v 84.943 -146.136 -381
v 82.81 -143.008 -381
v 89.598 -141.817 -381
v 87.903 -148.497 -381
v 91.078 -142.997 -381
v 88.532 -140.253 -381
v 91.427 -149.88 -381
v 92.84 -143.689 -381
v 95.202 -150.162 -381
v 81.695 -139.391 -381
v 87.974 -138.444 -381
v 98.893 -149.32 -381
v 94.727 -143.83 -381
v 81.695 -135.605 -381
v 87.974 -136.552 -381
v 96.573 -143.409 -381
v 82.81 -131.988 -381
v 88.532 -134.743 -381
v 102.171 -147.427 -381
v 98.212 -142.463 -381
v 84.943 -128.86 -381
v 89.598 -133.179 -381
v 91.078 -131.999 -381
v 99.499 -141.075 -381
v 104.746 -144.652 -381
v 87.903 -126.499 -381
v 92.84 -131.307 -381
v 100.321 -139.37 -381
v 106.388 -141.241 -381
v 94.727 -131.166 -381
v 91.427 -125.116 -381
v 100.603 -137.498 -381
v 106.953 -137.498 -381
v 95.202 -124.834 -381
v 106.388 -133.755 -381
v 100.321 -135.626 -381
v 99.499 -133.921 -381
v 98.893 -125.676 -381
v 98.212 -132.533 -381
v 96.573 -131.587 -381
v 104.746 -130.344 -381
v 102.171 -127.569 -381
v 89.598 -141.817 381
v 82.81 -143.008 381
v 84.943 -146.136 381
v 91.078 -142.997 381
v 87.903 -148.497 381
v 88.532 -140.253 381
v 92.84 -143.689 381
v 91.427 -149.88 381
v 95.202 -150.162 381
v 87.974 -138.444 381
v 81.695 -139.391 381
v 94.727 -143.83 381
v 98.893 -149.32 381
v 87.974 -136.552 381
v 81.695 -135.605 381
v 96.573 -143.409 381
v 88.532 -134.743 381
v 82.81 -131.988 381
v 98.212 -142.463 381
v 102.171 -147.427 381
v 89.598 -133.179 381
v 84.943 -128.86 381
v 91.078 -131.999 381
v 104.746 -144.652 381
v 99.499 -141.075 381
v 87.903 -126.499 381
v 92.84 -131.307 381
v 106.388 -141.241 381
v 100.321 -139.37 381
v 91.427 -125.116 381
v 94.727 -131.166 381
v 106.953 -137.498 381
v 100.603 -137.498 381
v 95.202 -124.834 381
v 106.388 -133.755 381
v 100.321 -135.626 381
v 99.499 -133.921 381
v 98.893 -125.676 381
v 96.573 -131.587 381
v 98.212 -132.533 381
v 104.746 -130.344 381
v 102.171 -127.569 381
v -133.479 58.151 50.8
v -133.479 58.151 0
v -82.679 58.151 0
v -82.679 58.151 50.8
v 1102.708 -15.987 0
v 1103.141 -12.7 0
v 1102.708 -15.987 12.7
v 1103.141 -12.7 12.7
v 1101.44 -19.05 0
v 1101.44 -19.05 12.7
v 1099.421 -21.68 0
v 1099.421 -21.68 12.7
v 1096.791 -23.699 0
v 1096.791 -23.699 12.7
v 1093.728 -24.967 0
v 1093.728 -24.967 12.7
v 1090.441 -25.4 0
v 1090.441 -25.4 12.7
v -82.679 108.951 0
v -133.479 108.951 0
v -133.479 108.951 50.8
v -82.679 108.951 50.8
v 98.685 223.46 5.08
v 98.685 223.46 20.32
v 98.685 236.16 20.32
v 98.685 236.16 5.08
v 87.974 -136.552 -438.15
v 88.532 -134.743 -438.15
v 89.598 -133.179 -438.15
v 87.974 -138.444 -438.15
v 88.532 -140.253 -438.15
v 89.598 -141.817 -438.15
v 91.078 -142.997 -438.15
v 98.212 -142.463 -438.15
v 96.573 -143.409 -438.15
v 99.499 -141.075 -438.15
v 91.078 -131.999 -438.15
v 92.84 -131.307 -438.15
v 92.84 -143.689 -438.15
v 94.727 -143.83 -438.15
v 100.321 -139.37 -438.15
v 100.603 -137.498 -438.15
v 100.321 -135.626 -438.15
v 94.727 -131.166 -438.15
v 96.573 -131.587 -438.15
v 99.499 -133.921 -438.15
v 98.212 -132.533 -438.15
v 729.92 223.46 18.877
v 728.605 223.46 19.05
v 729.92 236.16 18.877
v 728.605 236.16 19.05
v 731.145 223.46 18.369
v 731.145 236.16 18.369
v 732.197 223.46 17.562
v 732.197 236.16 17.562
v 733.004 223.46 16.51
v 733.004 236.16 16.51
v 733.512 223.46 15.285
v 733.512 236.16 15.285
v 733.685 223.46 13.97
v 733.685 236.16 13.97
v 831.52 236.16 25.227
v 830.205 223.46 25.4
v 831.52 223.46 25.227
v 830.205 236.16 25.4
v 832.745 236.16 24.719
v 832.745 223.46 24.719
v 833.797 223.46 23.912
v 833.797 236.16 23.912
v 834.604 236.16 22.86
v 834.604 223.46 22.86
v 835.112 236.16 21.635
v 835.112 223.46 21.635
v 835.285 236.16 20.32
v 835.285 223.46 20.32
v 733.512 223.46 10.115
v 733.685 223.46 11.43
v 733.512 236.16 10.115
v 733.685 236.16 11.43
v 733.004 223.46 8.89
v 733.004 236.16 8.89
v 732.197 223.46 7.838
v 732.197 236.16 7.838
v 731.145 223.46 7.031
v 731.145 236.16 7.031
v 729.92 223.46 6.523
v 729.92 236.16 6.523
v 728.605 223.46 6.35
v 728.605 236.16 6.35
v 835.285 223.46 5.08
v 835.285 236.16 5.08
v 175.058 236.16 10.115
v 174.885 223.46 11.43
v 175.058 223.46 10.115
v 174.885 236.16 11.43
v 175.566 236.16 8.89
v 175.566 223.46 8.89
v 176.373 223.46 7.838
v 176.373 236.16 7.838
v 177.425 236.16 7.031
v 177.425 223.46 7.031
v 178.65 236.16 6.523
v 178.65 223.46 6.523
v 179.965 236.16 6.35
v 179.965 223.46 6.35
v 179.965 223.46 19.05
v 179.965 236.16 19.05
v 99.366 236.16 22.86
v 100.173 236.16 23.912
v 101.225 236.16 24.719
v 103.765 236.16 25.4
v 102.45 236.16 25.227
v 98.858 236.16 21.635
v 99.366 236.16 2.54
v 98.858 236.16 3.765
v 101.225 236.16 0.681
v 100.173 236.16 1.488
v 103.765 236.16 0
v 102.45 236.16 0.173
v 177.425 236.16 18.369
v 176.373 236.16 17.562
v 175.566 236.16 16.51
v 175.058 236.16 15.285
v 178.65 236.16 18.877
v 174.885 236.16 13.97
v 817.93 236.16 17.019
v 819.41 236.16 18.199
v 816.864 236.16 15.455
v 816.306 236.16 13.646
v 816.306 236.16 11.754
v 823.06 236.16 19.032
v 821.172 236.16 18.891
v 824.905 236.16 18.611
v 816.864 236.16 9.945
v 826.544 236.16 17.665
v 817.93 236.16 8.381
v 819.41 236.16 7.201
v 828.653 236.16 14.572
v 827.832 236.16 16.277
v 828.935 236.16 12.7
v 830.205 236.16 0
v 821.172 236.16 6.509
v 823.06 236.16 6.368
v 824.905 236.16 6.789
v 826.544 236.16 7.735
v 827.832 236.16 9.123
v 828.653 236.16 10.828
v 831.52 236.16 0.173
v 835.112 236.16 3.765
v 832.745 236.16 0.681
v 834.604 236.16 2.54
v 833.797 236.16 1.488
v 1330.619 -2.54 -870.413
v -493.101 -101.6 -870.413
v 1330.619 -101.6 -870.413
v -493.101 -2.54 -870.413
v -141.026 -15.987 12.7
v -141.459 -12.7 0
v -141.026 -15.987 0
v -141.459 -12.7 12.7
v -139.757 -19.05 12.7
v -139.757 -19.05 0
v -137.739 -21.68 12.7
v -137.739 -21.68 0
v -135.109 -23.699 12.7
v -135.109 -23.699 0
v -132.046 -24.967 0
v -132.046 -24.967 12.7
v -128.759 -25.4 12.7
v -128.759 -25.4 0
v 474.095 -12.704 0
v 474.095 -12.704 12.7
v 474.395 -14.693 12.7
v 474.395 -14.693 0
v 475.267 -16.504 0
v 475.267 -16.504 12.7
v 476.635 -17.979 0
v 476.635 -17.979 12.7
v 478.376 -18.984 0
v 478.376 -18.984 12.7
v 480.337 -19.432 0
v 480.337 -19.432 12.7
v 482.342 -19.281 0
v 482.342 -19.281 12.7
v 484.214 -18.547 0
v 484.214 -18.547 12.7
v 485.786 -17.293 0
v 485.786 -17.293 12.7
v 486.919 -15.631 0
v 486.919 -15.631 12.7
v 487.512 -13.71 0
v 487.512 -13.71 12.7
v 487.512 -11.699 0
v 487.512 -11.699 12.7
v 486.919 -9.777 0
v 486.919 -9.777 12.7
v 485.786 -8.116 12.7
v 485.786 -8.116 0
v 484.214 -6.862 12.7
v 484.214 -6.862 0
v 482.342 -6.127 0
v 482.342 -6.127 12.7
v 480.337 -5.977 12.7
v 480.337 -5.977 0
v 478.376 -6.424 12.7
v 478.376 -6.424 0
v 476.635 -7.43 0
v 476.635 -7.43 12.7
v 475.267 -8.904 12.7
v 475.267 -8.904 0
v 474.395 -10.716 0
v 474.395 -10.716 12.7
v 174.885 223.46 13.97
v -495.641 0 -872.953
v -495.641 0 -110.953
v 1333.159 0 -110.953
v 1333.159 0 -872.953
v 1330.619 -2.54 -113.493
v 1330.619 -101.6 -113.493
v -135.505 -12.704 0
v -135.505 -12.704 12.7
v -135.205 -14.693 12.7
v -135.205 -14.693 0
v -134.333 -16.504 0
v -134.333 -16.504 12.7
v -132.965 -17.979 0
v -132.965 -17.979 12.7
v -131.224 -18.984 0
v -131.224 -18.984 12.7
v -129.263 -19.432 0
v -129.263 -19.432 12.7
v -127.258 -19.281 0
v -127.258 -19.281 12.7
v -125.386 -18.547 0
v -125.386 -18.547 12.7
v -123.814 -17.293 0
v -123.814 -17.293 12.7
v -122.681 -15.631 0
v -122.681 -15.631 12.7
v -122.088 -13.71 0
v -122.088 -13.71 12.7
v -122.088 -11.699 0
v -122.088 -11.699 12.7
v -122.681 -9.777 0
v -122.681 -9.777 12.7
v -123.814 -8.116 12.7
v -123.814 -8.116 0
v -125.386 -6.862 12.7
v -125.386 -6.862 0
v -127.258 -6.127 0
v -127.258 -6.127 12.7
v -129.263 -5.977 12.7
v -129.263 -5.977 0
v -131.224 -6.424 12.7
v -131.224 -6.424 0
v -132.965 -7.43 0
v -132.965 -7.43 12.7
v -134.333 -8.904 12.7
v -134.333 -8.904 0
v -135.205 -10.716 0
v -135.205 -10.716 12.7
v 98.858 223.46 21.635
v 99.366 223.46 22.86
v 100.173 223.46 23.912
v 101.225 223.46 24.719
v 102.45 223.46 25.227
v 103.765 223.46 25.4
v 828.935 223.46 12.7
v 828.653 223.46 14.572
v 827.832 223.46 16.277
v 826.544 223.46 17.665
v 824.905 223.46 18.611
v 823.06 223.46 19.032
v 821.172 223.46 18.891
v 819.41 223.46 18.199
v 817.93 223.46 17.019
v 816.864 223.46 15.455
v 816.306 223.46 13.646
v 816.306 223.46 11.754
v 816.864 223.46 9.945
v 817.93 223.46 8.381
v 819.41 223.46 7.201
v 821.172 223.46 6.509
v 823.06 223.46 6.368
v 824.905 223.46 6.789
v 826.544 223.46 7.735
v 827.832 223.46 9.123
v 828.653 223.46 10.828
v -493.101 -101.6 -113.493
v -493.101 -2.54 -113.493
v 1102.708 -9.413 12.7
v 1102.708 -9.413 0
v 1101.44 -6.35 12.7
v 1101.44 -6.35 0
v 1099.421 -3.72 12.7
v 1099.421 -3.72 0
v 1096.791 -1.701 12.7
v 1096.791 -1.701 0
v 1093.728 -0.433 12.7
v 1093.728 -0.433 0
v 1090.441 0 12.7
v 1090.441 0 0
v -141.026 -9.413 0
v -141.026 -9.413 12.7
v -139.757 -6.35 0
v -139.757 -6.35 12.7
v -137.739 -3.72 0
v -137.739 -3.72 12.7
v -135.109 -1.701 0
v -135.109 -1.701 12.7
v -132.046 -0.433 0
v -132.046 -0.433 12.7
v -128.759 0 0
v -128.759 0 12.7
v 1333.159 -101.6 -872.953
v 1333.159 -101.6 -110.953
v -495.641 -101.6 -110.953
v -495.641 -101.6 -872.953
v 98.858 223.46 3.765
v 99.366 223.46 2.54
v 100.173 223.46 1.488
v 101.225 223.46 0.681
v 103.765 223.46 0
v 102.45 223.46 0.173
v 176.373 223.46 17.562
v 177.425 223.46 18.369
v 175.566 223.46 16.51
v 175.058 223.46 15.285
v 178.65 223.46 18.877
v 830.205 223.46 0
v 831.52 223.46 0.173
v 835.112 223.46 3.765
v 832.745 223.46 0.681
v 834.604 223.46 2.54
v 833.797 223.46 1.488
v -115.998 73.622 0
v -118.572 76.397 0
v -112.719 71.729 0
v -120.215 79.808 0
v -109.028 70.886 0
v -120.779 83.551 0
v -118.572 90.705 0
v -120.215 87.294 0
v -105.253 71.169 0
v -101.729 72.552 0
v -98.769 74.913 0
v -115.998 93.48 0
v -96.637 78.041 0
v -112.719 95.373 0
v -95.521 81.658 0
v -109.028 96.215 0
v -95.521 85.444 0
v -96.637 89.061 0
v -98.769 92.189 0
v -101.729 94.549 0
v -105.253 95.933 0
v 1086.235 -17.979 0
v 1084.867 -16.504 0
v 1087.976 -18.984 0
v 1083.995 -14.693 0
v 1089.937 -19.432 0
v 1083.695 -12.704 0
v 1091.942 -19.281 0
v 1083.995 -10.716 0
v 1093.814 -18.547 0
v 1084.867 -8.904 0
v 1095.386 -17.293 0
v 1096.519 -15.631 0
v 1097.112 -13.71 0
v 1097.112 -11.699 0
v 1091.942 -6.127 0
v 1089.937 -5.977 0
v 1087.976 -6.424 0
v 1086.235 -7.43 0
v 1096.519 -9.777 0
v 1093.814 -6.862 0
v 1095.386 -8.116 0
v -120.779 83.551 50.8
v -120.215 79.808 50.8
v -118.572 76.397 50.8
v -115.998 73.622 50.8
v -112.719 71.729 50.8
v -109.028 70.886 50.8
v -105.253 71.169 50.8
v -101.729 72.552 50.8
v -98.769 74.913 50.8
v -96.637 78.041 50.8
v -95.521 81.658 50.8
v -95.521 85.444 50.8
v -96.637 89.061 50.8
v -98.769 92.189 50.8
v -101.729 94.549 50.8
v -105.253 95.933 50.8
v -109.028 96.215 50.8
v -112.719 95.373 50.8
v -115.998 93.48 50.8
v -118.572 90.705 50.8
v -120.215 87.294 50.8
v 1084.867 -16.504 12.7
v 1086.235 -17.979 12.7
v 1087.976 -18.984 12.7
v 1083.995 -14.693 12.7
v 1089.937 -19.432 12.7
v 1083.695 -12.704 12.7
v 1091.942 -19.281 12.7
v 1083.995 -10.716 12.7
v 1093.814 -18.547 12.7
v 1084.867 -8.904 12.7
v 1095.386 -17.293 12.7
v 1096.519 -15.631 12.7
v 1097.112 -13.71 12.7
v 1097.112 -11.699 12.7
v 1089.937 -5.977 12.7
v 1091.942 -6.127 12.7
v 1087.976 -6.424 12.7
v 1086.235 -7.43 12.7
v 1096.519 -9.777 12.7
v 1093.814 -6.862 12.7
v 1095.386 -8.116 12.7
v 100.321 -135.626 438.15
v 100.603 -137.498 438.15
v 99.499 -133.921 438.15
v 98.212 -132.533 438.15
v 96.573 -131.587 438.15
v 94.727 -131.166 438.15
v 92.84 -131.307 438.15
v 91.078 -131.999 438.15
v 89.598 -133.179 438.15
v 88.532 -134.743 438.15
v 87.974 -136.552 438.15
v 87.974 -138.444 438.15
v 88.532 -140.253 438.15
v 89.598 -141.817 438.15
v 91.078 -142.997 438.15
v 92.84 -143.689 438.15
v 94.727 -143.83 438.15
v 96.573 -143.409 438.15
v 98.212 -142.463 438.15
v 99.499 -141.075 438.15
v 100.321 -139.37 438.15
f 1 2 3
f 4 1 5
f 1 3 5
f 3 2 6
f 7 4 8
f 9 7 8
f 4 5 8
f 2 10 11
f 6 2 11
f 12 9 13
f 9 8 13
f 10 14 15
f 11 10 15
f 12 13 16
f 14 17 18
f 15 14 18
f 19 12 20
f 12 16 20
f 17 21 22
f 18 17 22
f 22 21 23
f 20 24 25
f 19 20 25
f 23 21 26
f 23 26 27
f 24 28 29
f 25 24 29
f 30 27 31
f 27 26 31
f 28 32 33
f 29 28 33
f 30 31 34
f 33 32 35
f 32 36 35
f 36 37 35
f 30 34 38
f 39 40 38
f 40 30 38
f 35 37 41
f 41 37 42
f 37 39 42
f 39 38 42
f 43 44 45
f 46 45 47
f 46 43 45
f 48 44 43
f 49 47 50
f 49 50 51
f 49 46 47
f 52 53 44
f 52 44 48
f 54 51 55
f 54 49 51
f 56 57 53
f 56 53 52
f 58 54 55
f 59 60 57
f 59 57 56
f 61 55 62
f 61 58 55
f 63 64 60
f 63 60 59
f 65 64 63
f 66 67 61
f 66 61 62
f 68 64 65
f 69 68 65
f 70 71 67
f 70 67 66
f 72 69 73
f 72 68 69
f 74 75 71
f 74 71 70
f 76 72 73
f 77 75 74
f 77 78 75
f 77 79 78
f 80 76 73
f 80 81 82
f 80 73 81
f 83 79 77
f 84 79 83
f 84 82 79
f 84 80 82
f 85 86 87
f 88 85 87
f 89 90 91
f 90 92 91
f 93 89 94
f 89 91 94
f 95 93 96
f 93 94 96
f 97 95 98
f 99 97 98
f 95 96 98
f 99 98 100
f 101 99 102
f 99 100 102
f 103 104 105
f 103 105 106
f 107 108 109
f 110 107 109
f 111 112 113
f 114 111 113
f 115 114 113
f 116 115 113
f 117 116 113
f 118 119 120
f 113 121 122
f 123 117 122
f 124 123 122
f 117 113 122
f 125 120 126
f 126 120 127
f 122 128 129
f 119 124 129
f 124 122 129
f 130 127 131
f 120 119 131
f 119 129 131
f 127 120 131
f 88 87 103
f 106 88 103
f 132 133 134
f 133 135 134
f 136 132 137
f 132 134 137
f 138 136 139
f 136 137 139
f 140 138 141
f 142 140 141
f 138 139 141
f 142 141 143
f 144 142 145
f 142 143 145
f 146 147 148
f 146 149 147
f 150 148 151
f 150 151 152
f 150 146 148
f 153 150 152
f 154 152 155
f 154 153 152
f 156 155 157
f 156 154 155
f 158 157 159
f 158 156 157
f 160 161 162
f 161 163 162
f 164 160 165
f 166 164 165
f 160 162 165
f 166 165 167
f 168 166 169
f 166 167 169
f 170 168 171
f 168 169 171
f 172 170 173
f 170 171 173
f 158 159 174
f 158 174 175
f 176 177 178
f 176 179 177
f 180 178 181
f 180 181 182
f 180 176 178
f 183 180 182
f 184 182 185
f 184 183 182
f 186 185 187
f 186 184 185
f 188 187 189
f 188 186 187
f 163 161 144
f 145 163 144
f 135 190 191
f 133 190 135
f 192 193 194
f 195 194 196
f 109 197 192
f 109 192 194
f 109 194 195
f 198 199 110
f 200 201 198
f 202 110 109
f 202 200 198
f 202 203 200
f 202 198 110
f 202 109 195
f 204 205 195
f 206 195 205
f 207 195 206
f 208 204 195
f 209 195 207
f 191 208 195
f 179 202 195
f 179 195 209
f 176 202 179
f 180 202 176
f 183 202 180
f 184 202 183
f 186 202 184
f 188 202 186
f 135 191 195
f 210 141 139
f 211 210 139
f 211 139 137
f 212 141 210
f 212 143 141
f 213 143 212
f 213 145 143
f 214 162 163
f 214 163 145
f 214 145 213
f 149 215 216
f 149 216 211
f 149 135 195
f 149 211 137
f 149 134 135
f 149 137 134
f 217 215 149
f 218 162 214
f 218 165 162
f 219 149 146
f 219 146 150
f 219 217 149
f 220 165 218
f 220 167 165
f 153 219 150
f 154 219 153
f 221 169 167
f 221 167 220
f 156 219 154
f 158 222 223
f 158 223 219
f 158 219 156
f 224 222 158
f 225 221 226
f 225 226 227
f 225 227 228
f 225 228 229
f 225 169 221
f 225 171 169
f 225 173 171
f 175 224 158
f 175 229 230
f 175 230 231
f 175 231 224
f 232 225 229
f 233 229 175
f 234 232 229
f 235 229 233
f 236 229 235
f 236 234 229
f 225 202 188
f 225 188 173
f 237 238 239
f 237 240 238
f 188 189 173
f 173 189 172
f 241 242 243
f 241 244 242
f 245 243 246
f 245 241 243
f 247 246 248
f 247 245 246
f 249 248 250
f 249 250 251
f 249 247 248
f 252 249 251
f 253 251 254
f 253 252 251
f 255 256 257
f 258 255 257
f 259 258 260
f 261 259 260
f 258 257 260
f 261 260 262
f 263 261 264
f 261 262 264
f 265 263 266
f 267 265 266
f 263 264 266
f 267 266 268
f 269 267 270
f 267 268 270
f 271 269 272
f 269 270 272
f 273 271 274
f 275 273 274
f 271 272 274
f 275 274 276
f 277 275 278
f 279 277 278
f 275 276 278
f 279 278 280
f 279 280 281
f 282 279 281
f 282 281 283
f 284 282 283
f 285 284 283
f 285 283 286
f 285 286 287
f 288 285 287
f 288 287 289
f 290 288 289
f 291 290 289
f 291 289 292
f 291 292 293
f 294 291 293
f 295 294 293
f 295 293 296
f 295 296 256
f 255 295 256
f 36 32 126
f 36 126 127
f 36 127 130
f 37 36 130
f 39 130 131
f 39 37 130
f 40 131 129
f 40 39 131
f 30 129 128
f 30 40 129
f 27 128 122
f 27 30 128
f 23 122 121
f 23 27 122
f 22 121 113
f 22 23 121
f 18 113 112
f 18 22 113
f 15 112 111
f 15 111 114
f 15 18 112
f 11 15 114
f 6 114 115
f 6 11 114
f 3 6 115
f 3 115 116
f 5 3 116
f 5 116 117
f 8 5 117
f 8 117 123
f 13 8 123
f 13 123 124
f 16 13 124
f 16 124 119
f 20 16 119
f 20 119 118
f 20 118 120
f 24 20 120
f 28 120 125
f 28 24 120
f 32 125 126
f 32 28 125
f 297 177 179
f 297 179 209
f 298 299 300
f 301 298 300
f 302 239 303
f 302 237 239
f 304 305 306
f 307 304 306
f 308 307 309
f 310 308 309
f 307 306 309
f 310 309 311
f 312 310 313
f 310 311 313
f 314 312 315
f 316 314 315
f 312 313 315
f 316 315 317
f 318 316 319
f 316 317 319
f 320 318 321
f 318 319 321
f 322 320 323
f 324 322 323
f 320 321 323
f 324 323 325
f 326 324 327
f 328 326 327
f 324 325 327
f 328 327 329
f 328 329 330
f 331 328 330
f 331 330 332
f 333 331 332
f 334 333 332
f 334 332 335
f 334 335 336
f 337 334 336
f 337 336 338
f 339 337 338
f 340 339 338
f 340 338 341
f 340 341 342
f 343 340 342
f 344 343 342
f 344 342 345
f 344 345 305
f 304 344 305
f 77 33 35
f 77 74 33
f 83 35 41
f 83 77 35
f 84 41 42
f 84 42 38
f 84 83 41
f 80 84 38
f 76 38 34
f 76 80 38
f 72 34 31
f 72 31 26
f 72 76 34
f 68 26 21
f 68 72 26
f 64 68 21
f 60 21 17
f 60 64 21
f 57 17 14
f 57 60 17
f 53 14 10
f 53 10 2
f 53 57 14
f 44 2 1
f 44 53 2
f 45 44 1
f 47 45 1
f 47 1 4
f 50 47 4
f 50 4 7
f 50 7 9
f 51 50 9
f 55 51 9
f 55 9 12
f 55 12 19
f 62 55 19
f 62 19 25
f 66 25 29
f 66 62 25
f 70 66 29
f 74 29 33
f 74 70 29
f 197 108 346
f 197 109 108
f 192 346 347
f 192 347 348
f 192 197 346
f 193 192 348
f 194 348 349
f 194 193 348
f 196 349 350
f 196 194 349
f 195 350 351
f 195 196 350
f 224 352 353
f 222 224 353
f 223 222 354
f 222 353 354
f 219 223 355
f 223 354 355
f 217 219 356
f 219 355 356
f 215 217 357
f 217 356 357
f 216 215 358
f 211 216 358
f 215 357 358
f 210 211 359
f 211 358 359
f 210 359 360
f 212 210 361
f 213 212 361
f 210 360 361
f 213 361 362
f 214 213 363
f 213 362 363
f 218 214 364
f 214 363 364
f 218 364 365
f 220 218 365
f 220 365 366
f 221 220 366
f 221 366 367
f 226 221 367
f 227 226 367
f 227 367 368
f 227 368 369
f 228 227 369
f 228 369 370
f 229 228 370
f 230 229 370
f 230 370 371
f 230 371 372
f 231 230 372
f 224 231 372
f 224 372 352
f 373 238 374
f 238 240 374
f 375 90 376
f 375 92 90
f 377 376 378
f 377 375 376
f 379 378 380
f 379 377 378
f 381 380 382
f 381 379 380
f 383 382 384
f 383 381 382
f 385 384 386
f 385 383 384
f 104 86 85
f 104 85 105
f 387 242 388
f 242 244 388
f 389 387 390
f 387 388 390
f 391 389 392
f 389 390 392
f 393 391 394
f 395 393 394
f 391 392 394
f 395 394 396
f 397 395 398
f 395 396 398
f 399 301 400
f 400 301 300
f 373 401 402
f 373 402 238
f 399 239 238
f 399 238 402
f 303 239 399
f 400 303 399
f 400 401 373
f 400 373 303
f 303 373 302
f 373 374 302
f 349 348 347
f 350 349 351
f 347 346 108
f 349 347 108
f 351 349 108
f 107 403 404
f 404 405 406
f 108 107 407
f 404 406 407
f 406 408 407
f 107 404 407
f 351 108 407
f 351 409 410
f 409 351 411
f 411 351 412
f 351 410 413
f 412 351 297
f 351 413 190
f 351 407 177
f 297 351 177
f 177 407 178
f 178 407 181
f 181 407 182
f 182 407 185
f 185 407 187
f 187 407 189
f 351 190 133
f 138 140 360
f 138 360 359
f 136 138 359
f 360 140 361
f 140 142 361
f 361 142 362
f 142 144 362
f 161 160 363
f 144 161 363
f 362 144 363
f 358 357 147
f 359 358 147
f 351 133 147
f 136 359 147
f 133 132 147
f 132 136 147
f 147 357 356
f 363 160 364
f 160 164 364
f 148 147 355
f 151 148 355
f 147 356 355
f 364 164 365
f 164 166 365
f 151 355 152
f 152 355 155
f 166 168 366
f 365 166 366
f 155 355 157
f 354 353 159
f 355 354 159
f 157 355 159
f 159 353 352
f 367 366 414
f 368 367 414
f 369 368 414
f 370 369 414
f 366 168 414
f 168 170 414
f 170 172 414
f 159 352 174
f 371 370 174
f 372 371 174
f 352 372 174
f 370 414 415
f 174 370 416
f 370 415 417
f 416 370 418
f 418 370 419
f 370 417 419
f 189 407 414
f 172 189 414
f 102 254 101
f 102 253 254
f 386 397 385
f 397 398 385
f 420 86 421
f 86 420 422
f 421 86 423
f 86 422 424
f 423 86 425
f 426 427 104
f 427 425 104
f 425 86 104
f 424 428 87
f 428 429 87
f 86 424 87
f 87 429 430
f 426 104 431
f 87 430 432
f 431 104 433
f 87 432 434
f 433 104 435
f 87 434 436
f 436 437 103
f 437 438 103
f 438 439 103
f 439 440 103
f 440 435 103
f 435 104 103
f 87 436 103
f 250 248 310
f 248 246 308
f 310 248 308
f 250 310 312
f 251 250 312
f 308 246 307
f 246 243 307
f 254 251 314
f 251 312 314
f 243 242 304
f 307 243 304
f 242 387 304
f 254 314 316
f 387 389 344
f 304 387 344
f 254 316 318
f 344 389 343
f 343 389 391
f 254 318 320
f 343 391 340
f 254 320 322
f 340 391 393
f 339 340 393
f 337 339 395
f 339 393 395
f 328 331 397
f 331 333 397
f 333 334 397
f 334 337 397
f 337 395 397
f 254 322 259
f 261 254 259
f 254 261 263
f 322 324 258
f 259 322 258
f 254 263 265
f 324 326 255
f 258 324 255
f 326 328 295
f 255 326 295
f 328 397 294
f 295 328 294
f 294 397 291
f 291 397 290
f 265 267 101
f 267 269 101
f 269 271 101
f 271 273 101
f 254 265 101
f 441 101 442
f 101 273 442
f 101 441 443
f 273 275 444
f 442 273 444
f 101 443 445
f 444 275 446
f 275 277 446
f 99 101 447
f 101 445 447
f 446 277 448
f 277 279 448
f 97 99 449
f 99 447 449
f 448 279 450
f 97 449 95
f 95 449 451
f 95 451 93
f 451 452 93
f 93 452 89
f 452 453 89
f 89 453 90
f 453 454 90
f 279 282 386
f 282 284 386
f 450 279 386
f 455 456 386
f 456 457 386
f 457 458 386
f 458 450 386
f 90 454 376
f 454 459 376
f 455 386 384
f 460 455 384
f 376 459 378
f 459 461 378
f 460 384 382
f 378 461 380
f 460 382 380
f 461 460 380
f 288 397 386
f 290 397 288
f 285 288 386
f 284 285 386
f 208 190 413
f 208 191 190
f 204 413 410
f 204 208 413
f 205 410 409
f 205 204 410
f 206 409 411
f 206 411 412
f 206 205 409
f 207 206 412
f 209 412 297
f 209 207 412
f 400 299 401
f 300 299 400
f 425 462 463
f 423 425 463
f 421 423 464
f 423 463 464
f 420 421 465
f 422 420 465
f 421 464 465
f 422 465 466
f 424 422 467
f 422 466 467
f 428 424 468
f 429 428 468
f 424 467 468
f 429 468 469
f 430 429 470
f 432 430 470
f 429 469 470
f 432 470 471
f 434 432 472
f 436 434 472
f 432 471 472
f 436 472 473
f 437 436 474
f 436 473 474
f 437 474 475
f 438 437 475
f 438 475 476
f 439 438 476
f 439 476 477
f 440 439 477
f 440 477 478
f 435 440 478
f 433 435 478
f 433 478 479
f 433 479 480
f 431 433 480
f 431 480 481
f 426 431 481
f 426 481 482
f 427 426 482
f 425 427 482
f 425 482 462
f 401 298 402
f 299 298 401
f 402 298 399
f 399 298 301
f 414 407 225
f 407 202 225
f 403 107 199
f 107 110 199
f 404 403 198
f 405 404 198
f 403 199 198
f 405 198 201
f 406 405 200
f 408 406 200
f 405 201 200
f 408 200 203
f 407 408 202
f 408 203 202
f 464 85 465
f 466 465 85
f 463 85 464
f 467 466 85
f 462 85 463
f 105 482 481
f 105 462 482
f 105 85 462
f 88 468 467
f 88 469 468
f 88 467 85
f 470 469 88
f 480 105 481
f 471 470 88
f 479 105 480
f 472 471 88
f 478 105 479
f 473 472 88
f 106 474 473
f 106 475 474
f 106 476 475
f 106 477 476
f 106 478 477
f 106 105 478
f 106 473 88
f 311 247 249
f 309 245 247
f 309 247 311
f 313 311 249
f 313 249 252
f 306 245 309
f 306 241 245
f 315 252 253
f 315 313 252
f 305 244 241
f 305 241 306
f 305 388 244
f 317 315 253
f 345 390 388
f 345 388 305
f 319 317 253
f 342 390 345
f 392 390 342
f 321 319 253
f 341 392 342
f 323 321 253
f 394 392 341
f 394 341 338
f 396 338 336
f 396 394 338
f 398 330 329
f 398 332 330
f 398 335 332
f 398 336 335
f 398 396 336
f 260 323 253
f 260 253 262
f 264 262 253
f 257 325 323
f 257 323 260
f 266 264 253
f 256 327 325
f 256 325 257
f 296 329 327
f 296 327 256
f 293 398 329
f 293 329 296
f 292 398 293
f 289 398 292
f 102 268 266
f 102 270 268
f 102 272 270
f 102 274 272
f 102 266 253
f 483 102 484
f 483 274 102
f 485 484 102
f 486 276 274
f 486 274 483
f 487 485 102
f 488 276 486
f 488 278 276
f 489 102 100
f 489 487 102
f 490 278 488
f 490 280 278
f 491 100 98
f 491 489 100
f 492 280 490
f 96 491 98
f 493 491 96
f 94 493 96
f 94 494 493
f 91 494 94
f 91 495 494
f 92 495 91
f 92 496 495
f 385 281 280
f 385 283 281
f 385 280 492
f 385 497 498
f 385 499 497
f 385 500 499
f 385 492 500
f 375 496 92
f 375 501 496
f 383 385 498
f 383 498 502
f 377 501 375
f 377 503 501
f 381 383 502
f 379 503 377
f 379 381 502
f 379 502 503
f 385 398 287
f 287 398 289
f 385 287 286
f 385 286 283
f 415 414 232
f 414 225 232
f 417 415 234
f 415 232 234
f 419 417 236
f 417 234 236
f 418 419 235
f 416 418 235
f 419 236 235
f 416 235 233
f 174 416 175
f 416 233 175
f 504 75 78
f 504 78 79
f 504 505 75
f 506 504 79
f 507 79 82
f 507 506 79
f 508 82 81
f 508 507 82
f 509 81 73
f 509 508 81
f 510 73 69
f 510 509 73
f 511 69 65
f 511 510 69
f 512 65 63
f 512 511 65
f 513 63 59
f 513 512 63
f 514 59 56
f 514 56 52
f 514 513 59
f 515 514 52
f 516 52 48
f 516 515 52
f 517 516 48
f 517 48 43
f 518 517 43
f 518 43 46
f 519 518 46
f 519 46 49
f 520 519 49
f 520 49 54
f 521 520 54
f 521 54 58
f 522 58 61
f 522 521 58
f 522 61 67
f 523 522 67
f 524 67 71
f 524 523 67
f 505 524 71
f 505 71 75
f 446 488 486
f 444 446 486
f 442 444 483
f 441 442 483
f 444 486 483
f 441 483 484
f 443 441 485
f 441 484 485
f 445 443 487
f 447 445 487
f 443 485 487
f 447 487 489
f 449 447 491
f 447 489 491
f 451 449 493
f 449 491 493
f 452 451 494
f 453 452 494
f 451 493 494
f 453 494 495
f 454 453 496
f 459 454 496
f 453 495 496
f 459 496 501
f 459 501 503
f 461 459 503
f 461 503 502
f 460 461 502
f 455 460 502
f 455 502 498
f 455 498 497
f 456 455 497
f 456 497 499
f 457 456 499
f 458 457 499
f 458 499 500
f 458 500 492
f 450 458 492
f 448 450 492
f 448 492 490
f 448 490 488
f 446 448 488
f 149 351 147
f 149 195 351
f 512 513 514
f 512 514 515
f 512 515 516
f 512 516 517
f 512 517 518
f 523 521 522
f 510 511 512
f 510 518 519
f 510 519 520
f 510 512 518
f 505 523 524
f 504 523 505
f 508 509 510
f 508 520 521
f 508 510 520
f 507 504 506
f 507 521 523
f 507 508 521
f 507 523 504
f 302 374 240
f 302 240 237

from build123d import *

# Parameters (mm, degrees)
F0_W      = 1244.6
F0_H      = 12.7
F1_DEPTH  = 25.4
F2_R      = 12.69999
F4_D      = 13.49248
F5_R      = 6.35
F6_DEPTH  = 438.15
F5_R_2    = 12.7
F7_DEPTH  = 381
F8_W      = 50.8
F8_H      = 50.8
F9_DEPTH  = 50.8
F11_D     = 25.4
F12_W     = 736.6
F12_H     = 12.7
F13_DEPTH = 25.4
F14_W     = 558.8
F14_H     = 12.7
F15_DEPTH = 236.1610186348
F14_R     = 6.35
F17_R     = 5.08
F18_W     = 1828.8
F18_H     = 762
F19_DEPTH = 101.6
F20_T     = -2.54


# Not quite as in the source:
# - a fillet or chamfer is up to 0.001 mm smaller than in the source, because OpenCascade refuses the exact size


with BuildPart() as f1:
    # F0 (on Front) → F1 (new body)
    with BuildSketch(Plane.XZ):
        with Locations((480.8411406559, 6.35)):
            Rectangle(F0_W, F0_H)
    extrude(amount=F1_DEPTH)

    # F2 (radius 12.7 in the source; OpenCascade refuses exactly that, so slightly less here)
    f2_edges = [f1.edges().sort_by_distance(p)[0] for p in [
        (-141.458859, -25.4, 6.35),
        (1103.141141, -25.4, 6.35),
        (1103.141141, 0, 6.35),
        (-141.458859, 0, 6.35),
    ]]
    fillet(f2_edges, radius=F2_R)

    # F4 (through all)
    with Locations(Plane(origin=(0, 0, 0), x_dir=(1, 0, 0), z_dir=(0, 0, -1))):
        with Locations((480.8411406559, 12.7041507512), (1090.4411406559, 12.7041507512), (-128.7588593441, 12.7041507512)):
            Hole(F4_D / 2)


with BuildPart() as f6:
    # F5 (on Top) → F6 (new body, symmetric)
    with BuildSketch(Plane.XY):
        with Locations((94.2526757717, -137.4980062246)):
            Circle(F5_R)
    extrude(amount=F6_DEPTH, both=True)

    # F5 (on Top) → F7 (join, symmetric)
    with BuildSketch(Plane.XY):
        with Locations((94.2526757717, -137.4980062246)):
            Circle(F5_R_2)
        with Locations((94.2526757717, -137.4980062246)):
            Circle(F5_R, mode=Mode.SUBTRACT)
    extrude(amount=F7_DEPTH, both=True)


with BuildPart() as f9:
    # F8 (on Top) → F9 (new body)
    with BuildSketch(Plane.XY):
        with Locations((-108.0792423666, 83.5509366974)):
            Rectangle(F8_W, F8_H)
    extrude(amount=F9_DEPTH)

    # F11 (through all)
    with Locations(Plane(origin=(0, 0, 0), x_dir=(1, 0, 0), z_dir=(0, 0, -1))):
        with Locations((-108.0792423666, -83.5509366974)):
            Hole(F11_D / 2)


with BuildPart() as f13:
    # F12 (on Top) → F13 (new body)
    with BuildSketch(Plane.XY):
        with Locations((466.9850397587, 229.8100186348)):
            Rectangle(F12_W, F12_H)
    extrude(amount=F13_DEPTH)


with BuildPart() as f15:
    # F14 (on Front) → F15 (new body, through all)
    with BuildSketch(Plane.XZ):
        with Locations((454.2850397587, 12.7)):
            Rectangle(F14_W, F14_H)
    extrude(amount=-F15_DEPTH)


with BuildPart() as f15b:
    # F14 (on Front) → F15, piece 2 (new body, through all)
    with BuildSketch(Plane.XZ):
        with Locations((822.5850397587, 12.7)):
            Circle(F14_R)
    extrude(amount=-F15_DEPTH)


with BuildPart() as f13_1:
    add(f13.part)

    # F16: cut F15, F15b
    add(f15.part, mode=Mode.SUBTRACT)
    add(f15b.part, mode=Mode.SUBTRACT)

    # F17
    f17_edges = [f13_1.edges().sort_by_distance(p)[0] for p in [
        (98.68504, 229.810019, 25.4),
        (835.28504, 229.810019, 25.4),
        (733.68504, 229.810019, 6.35),
        (174.88504, 229.810019, 6.35),
        (174.88504, 229.810019, 19.05),
        (98.68504, 229.810019, 0),
        (835.28504, 229.810019, 0),
        (733.68504, 229.810019, 19.05),
    ]]
    fillet(f17_edges, radius=F17_R)


with BuildPart() as f19:
    # F18 (on Front) → F19 (new body)
    with BuildSketch(Plane.XZ):
        with Locations((418.7591709614, -491.9529797588)):
            Rectangle(F18_W, F18_H)
    extrude(amount=F19_DEPTH)

    # F20
    f20_openings = [f19.faces().sort_by_distance(p)[0] for p in [
        (418.759171, -101.6, -491.95298),
    ]]
    offset(amount=F20_T, openings=f20_openings)


solid = Compound([f1.part, f6.part, f9.part, f13_1.part, f19.part])
